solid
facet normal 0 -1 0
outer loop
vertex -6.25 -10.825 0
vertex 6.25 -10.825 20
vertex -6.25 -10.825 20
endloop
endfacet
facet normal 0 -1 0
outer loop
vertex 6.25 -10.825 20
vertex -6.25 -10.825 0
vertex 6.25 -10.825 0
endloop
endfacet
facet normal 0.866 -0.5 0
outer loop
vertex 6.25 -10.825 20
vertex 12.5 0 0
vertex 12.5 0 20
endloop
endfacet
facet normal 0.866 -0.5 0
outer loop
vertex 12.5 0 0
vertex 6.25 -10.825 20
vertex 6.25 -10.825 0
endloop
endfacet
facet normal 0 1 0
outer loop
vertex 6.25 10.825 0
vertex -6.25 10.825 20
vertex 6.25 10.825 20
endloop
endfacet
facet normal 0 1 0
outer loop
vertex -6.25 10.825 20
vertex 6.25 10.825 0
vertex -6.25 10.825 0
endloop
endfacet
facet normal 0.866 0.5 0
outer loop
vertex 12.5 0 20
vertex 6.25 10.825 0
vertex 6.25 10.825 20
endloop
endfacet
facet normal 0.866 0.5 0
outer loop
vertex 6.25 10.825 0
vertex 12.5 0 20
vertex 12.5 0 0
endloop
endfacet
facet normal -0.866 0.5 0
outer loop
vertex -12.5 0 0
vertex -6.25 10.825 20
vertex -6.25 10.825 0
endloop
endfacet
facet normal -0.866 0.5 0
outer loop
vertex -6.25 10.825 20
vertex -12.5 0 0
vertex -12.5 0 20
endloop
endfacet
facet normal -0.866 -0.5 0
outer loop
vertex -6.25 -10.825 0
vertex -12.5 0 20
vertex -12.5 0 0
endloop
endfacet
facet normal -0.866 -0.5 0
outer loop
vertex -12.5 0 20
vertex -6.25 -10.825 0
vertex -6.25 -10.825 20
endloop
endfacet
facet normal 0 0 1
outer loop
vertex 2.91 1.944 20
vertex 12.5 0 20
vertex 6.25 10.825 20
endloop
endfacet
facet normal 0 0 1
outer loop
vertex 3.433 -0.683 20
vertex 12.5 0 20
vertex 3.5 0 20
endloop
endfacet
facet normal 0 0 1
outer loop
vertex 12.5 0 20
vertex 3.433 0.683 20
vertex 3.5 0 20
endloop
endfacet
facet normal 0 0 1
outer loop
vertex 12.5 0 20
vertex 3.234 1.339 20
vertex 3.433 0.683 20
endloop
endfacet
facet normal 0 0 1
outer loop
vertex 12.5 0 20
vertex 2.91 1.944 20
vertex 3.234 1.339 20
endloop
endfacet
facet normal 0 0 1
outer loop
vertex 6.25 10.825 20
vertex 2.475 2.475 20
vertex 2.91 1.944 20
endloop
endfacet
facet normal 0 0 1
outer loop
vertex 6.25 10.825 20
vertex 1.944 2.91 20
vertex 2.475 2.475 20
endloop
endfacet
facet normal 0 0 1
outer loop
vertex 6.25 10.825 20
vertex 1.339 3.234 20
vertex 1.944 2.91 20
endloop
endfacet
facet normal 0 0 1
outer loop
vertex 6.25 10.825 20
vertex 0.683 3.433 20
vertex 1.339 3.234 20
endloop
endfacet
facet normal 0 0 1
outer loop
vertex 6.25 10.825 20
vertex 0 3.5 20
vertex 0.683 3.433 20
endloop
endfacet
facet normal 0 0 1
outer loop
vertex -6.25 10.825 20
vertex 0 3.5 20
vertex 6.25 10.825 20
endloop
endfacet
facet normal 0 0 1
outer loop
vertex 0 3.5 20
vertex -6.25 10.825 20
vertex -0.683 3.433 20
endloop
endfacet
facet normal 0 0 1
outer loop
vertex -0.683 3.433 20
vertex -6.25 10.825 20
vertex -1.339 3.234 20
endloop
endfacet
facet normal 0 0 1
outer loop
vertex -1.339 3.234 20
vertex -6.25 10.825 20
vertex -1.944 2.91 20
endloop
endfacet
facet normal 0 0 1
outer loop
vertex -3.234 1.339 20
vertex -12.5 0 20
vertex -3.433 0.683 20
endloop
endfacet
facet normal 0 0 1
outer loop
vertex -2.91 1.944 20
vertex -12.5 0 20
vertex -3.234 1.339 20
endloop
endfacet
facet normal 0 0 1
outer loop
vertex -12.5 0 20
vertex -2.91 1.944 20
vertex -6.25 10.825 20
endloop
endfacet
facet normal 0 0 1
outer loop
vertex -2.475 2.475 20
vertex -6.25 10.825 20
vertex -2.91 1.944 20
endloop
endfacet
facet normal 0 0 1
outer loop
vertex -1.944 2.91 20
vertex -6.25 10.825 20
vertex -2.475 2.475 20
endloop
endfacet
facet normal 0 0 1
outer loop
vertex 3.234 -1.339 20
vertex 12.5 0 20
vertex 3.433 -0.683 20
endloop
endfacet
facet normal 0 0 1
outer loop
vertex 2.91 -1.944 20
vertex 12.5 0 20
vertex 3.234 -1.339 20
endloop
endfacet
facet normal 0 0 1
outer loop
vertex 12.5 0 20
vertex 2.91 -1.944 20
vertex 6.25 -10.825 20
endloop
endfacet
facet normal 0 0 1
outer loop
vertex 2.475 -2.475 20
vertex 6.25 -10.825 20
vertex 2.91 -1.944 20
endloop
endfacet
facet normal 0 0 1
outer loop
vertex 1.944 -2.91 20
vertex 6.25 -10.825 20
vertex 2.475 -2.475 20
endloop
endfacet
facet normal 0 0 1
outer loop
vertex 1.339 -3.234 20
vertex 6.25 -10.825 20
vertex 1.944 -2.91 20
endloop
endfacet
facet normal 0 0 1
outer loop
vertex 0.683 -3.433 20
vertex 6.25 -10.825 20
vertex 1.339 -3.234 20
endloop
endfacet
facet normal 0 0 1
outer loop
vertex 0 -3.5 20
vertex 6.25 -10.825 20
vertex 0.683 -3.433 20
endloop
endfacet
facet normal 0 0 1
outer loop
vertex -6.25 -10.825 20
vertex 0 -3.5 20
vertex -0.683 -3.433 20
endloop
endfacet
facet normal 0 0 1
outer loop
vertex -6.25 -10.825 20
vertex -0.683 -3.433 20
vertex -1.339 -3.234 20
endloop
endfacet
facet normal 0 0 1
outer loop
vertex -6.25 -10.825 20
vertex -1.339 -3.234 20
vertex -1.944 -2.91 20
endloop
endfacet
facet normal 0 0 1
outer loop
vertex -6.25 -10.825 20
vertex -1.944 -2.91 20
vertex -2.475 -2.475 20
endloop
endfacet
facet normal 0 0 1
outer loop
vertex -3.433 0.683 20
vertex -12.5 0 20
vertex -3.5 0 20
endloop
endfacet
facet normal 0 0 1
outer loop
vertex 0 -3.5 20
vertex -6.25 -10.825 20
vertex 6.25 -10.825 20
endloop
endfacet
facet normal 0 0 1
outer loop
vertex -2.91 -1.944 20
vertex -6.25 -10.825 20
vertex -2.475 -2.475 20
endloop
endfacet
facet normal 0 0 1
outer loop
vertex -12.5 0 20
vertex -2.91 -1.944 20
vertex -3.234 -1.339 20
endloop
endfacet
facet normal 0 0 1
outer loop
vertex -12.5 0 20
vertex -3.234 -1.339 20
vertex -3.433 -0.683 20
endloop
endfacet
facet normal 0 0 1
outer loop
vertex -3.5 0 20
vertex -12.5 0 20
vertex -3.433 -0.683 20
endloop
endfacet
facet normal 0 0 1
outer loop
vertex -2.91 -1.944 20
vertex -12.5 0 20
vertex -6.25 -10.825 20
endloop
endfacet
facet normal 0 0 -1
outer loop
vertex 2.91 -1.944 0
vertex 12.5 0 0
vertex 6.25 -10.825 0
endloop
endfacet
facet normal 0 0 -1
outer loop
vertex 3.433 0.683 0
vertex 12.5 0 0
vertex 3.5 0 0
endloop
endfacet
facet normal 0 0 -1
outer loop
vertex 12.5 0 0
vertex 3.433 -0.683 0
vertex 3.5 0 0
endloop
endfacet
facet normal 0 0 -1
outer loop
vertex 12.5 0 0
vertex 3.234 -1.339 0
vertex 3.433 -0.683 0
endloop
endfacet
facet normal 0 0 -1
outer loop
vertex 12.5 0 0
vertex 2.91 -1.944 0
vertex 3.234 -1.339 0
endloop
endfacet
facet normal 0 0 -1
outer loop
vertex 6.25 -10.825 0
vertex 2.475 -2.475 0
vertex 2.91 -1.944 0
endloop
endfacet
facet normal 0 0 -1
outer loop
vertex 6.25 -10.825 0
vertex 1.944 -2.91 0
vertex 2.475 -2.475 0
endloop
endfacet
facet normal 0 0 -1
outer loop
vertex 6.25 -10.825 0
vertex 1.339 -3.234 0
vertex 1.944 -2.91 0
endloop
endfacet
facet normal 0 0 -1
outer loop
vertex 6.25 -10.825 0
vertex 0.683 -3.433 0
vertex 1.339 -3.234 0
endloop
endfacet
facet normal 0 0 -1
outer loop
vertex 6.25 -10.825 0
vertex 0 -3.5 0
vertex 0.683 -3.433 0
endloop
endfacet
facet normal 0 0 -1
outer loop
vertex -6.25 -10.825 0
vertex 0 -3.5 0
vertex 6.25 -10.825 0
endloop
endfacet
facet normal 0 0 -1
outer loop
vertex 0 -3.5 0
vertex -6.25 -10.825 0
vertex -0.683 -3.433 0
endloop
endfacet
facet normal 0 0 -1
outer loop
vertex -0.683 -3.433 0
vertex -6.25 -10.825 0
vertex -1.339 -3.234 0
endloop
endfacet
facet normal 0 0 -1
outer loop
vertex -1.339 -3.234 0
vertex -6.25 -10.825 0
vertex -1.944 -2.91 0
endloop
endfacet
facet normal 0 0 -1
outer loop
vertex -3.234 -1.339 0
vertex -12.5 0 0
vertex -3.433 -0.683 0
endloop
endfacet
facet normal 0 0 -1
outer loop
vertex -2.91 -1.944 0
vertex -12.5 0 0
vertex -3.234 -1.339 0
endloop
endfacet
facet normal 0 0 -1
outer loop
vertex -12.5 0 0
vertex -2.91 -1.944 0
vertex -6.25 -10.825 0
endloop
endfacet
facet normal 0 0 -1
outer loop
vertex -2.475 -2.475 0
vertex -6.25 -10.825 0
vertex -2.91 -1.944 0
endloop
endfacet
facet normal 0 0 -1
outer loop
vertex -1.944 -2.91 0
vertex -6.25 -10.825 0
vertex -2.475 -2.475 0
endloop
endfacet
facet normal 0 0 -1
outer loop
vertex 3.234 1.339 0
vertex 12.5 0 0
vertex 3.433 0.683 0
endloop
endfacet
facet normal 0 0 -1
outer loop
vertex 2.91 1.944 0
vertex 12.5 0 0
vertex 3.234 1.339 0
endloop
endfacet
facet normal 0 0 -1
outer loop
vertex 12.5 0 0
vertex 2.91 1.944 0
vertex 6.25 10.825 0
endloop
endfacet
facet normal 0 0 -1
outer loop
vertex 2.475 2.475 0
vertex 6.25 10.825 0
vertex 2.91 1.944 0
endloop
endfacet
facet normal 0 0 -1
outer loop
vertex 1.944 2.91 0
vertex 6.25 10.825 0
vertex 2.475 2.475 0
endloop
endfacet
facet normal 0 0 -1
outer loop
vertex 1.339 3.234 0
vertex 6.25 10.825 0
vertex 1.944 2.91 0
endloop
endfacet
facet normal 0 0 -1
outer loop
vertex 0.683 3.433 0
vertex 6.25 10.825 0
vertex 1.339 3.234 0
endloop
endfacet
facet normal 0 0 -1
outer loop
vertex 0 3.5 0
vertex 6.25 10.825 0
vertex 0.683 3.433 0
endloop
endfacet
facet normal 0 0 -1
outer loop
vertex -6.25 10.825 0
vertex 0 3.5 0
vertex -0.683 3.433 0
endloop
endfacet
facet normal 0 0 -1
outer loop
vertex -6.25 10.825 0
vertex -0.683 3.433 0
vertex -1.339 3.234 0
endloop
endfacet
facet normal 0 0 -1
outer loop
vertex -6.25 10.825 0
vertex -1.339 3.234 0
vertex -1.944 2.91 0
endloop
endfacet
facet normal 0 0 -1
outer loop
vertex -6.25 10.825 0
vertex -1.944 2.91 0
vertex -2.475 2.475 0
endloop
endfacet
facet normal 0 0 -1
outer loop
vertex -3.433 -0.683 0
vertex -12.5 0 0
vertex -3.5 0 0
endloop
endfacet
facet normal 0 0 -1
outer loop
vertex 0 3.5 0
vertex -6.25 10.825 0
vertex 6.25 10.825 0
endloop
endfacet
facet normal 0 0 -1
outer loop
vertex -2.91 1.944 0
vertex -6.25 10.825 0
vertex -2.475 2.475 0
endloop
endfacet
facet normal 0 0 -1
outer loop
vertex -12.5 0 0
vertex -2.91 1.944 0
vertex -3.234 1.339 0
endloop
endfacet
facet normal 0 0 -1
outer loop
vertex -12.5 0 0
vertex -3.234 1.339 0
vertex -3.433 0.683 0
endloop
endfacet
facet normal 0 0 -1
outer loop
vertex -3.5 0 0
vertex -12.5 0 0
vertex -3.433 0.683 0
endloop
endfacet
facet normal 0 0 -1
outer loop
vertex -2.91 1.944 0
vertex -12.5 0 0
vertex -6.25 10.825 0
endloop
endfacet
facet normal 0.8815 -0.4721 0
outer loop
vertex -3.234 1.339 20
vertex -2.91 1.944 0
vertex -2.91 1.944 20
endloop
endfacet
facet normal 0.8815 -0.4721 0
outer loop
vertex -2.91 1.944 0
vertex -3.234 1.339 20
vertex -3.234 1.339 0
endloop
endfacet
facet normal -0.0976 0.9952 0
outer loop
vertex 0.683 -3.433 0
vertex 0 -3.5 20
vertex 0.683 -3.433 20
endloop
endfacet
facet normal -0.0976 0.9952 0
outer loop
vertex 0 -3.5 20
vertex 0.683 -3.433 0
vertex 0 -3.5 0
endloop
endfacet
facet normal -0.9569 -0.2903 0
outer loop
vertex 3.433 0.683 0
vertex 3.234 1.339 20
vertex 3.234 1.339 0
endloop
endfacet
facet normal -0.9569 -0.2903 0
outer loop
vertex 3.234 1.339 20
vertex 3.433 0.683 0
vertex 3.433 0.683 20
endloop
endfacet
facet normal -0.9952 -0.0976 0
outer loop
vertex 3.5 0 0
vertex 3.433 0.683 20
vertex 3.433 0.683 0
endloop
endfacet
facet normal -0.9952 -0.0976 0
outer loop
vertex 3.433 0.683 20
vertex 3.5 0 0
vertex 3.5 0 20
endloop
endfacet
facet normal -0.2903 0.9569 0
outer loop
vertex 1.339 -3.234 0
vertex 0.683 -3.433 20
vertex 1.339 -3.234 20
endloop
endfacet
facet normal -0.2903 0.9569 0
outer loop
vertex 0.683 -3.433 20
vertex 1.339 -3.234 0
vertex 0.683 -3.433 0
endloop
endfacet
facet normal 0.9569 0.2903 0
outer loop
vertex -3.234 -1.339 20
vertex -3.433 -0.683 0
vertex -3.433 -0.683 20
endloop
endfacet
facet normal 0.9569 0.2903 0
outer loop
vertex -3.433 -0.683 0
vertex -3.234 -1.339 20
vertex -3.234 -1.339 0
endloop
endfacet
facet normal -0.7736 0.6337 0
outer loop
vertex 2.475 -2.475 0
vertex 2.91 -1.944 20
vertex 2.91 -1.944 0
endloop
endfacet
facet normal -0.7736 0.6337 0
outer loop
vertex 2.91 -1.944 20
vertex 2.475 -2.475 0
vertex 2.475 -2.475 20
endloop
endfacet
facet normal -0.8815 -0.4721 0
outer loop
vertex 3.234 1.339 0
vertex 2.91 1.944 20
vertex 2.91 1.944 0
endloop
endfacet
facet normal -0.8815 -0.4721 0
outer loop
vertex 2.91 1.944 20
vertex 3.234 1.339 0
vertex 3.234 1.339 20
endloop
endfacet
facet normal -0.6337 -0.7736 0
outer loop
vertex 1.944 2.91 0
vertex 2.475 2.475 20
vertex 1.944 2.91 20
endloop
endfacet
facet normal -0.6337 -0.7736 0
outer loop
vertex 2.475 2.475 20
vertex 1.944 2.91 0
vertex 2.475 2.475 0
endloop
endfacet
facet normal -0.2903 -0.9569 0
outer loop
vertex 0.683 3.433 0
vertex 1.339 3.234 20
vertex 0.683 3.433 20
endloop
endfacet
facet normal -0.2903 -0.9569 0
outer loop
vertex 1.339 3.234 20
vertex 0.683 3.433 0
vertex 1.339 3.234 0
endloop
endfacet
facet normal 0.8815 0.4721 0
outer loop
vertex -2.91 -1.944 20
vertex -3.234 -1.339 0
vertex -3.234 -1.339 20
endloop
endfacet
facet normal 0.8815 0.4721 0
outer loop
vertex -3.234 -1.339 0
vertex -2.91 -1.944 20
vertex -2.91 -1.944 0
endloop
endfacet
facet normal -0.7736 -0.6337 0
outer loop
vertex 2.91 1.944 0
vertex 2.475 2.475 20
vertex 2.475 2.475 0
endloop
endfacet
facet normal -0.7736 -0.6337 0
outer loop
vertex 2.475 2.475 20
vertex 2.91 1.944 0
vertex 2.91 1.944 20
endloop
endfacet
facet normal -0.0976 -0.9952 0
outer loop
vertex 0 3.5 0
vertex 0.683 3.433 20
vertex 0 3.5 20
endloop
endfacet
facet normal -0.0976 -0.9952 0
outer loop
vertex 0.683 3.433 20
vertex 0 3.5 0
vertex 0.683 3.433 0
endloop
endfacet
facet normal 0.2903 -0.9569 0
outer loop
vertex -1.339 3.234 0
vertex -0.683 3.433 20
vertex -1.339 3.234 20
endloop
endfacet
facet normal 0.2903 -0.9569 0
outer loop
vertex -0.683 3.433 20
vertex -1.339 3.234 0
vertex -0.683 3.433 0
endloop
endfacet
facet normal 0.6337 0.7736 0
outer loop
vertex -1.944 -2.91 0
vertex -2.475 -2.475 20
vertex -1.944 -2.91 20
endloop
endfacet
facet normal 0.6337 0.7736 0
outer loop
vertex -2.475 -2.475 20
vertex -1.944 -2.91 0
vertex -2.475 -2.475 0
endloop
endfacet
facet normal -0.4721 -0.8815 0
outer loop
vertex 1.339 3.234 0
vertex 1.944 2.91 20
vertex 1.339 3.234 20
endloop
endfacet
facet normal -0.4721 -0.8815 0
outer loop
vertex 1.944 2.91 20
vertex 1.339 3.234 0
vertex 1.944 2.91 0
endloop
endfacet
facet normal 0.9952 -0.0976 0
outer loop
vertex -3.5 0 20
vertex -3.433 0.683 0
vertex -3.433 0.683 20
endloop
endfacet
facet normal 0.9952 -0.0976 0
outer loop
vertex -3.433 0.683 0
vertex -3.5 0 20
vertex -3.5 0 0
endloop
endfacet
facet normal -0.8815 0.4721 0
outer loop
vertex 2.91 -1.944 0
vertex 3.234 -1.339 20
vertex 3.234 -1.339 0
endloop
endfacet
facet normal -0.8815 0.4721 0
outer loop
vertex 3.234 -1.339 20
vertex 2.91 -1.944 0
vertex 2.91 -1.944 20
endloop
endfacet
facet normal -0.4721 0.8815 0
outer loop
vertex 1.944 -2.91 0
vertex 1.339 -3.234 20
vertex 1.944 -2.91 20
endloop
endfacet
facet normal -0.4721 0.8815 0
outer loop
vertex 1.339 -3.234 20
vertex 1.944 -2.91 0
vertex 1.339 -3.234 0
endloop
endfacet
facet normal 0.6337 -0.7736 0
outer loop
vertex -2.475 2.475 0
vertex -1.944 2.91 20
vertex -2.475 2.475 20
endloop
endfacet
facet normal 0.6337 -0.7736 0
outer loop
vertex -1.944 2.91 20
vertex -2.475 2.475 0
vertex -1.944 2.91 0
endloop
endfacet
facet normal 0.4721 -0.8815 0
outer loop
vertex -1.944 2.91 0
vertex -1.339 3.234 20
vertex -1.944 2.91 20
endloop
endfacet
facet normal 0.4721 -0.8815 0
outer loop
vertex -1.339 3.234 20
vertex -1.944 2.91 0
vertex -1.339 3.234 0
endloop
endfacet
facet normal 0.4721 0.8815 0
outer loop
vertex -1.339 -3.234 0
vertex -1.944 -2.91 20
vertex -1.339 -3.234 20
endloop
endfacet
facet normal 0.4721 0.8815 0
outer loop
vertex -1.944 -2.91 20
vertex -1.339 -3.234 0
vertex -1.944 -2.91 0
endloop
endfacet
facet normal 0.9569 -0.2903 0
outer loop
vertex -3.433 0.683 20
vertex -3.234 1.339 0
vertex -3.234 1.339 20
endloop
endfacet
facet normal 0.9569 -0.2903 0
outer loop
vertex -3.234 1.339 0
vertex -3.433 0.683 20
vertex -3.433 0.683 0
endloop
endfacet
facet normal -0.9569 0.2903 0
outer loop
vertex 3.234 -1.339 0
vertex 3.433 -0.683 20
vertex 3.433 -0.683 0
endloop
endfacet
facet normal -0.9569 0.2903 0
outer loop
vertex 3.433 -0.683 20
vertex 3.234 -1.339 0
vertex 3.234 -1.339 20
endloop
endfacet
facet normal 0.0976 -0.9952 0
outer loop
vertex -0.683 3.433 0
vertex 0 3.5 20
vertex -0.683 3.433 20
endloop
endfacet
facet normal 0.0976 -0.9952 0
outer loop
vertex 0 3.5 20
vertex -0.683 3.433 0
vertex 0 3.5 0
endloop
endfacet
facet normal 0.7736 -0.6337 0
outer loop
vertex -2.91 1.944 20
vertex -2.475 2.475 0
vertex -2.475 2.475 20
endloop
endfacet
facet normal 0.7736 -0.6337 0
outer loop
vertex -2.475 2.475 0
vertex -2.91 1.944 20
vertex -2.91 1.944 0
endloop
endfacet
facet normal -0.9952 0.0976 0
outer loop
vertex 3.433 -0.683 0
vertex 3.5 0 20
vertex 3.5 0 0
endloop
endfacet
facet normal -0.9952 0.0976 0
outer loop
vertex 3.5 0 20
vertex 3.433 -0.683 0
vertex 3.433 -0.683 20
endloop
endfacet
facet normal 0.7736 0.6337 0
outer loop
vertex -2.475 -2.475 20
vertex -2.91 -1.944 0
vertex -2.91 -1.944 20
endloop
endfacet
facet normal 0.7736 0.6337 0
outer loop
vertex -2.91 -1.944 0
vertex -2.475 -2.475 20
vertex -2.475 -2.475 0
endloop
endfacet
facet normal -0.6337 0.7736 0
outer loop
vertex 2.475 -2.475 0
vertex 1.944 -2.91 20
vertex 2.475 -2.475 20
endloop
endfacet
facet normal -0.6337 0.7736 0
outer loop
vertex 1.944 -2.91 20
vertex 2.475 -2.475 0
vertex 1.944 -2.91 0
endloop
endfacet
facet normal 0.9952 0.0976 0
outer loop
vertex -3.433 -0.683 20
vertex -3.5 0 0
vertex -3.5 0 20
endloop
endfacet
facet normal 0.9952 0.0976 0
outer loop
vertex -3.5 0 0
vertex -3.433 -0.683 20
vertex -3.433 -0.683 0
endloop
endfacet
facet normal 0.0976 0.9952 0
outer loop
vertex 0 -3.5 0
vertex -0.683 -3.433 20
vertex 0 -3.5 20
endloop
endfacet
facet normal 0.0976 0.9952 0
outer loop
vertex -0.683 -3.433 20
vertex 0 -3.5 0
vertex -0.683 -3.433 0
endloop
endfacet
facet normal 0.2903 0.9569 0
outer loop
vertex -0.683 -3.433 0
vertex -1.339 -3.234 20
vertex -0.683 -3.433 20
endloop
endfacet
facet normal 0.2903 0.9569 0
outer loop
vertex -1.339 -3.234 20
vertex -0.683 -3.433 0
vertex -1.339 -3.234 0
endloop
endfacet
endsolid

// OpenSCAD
difference(){
cylinder(d=25,h=20,$fn=6);
translate([0,0,-1])
    cylinder(d=7,h=22,$fn=32);
}
